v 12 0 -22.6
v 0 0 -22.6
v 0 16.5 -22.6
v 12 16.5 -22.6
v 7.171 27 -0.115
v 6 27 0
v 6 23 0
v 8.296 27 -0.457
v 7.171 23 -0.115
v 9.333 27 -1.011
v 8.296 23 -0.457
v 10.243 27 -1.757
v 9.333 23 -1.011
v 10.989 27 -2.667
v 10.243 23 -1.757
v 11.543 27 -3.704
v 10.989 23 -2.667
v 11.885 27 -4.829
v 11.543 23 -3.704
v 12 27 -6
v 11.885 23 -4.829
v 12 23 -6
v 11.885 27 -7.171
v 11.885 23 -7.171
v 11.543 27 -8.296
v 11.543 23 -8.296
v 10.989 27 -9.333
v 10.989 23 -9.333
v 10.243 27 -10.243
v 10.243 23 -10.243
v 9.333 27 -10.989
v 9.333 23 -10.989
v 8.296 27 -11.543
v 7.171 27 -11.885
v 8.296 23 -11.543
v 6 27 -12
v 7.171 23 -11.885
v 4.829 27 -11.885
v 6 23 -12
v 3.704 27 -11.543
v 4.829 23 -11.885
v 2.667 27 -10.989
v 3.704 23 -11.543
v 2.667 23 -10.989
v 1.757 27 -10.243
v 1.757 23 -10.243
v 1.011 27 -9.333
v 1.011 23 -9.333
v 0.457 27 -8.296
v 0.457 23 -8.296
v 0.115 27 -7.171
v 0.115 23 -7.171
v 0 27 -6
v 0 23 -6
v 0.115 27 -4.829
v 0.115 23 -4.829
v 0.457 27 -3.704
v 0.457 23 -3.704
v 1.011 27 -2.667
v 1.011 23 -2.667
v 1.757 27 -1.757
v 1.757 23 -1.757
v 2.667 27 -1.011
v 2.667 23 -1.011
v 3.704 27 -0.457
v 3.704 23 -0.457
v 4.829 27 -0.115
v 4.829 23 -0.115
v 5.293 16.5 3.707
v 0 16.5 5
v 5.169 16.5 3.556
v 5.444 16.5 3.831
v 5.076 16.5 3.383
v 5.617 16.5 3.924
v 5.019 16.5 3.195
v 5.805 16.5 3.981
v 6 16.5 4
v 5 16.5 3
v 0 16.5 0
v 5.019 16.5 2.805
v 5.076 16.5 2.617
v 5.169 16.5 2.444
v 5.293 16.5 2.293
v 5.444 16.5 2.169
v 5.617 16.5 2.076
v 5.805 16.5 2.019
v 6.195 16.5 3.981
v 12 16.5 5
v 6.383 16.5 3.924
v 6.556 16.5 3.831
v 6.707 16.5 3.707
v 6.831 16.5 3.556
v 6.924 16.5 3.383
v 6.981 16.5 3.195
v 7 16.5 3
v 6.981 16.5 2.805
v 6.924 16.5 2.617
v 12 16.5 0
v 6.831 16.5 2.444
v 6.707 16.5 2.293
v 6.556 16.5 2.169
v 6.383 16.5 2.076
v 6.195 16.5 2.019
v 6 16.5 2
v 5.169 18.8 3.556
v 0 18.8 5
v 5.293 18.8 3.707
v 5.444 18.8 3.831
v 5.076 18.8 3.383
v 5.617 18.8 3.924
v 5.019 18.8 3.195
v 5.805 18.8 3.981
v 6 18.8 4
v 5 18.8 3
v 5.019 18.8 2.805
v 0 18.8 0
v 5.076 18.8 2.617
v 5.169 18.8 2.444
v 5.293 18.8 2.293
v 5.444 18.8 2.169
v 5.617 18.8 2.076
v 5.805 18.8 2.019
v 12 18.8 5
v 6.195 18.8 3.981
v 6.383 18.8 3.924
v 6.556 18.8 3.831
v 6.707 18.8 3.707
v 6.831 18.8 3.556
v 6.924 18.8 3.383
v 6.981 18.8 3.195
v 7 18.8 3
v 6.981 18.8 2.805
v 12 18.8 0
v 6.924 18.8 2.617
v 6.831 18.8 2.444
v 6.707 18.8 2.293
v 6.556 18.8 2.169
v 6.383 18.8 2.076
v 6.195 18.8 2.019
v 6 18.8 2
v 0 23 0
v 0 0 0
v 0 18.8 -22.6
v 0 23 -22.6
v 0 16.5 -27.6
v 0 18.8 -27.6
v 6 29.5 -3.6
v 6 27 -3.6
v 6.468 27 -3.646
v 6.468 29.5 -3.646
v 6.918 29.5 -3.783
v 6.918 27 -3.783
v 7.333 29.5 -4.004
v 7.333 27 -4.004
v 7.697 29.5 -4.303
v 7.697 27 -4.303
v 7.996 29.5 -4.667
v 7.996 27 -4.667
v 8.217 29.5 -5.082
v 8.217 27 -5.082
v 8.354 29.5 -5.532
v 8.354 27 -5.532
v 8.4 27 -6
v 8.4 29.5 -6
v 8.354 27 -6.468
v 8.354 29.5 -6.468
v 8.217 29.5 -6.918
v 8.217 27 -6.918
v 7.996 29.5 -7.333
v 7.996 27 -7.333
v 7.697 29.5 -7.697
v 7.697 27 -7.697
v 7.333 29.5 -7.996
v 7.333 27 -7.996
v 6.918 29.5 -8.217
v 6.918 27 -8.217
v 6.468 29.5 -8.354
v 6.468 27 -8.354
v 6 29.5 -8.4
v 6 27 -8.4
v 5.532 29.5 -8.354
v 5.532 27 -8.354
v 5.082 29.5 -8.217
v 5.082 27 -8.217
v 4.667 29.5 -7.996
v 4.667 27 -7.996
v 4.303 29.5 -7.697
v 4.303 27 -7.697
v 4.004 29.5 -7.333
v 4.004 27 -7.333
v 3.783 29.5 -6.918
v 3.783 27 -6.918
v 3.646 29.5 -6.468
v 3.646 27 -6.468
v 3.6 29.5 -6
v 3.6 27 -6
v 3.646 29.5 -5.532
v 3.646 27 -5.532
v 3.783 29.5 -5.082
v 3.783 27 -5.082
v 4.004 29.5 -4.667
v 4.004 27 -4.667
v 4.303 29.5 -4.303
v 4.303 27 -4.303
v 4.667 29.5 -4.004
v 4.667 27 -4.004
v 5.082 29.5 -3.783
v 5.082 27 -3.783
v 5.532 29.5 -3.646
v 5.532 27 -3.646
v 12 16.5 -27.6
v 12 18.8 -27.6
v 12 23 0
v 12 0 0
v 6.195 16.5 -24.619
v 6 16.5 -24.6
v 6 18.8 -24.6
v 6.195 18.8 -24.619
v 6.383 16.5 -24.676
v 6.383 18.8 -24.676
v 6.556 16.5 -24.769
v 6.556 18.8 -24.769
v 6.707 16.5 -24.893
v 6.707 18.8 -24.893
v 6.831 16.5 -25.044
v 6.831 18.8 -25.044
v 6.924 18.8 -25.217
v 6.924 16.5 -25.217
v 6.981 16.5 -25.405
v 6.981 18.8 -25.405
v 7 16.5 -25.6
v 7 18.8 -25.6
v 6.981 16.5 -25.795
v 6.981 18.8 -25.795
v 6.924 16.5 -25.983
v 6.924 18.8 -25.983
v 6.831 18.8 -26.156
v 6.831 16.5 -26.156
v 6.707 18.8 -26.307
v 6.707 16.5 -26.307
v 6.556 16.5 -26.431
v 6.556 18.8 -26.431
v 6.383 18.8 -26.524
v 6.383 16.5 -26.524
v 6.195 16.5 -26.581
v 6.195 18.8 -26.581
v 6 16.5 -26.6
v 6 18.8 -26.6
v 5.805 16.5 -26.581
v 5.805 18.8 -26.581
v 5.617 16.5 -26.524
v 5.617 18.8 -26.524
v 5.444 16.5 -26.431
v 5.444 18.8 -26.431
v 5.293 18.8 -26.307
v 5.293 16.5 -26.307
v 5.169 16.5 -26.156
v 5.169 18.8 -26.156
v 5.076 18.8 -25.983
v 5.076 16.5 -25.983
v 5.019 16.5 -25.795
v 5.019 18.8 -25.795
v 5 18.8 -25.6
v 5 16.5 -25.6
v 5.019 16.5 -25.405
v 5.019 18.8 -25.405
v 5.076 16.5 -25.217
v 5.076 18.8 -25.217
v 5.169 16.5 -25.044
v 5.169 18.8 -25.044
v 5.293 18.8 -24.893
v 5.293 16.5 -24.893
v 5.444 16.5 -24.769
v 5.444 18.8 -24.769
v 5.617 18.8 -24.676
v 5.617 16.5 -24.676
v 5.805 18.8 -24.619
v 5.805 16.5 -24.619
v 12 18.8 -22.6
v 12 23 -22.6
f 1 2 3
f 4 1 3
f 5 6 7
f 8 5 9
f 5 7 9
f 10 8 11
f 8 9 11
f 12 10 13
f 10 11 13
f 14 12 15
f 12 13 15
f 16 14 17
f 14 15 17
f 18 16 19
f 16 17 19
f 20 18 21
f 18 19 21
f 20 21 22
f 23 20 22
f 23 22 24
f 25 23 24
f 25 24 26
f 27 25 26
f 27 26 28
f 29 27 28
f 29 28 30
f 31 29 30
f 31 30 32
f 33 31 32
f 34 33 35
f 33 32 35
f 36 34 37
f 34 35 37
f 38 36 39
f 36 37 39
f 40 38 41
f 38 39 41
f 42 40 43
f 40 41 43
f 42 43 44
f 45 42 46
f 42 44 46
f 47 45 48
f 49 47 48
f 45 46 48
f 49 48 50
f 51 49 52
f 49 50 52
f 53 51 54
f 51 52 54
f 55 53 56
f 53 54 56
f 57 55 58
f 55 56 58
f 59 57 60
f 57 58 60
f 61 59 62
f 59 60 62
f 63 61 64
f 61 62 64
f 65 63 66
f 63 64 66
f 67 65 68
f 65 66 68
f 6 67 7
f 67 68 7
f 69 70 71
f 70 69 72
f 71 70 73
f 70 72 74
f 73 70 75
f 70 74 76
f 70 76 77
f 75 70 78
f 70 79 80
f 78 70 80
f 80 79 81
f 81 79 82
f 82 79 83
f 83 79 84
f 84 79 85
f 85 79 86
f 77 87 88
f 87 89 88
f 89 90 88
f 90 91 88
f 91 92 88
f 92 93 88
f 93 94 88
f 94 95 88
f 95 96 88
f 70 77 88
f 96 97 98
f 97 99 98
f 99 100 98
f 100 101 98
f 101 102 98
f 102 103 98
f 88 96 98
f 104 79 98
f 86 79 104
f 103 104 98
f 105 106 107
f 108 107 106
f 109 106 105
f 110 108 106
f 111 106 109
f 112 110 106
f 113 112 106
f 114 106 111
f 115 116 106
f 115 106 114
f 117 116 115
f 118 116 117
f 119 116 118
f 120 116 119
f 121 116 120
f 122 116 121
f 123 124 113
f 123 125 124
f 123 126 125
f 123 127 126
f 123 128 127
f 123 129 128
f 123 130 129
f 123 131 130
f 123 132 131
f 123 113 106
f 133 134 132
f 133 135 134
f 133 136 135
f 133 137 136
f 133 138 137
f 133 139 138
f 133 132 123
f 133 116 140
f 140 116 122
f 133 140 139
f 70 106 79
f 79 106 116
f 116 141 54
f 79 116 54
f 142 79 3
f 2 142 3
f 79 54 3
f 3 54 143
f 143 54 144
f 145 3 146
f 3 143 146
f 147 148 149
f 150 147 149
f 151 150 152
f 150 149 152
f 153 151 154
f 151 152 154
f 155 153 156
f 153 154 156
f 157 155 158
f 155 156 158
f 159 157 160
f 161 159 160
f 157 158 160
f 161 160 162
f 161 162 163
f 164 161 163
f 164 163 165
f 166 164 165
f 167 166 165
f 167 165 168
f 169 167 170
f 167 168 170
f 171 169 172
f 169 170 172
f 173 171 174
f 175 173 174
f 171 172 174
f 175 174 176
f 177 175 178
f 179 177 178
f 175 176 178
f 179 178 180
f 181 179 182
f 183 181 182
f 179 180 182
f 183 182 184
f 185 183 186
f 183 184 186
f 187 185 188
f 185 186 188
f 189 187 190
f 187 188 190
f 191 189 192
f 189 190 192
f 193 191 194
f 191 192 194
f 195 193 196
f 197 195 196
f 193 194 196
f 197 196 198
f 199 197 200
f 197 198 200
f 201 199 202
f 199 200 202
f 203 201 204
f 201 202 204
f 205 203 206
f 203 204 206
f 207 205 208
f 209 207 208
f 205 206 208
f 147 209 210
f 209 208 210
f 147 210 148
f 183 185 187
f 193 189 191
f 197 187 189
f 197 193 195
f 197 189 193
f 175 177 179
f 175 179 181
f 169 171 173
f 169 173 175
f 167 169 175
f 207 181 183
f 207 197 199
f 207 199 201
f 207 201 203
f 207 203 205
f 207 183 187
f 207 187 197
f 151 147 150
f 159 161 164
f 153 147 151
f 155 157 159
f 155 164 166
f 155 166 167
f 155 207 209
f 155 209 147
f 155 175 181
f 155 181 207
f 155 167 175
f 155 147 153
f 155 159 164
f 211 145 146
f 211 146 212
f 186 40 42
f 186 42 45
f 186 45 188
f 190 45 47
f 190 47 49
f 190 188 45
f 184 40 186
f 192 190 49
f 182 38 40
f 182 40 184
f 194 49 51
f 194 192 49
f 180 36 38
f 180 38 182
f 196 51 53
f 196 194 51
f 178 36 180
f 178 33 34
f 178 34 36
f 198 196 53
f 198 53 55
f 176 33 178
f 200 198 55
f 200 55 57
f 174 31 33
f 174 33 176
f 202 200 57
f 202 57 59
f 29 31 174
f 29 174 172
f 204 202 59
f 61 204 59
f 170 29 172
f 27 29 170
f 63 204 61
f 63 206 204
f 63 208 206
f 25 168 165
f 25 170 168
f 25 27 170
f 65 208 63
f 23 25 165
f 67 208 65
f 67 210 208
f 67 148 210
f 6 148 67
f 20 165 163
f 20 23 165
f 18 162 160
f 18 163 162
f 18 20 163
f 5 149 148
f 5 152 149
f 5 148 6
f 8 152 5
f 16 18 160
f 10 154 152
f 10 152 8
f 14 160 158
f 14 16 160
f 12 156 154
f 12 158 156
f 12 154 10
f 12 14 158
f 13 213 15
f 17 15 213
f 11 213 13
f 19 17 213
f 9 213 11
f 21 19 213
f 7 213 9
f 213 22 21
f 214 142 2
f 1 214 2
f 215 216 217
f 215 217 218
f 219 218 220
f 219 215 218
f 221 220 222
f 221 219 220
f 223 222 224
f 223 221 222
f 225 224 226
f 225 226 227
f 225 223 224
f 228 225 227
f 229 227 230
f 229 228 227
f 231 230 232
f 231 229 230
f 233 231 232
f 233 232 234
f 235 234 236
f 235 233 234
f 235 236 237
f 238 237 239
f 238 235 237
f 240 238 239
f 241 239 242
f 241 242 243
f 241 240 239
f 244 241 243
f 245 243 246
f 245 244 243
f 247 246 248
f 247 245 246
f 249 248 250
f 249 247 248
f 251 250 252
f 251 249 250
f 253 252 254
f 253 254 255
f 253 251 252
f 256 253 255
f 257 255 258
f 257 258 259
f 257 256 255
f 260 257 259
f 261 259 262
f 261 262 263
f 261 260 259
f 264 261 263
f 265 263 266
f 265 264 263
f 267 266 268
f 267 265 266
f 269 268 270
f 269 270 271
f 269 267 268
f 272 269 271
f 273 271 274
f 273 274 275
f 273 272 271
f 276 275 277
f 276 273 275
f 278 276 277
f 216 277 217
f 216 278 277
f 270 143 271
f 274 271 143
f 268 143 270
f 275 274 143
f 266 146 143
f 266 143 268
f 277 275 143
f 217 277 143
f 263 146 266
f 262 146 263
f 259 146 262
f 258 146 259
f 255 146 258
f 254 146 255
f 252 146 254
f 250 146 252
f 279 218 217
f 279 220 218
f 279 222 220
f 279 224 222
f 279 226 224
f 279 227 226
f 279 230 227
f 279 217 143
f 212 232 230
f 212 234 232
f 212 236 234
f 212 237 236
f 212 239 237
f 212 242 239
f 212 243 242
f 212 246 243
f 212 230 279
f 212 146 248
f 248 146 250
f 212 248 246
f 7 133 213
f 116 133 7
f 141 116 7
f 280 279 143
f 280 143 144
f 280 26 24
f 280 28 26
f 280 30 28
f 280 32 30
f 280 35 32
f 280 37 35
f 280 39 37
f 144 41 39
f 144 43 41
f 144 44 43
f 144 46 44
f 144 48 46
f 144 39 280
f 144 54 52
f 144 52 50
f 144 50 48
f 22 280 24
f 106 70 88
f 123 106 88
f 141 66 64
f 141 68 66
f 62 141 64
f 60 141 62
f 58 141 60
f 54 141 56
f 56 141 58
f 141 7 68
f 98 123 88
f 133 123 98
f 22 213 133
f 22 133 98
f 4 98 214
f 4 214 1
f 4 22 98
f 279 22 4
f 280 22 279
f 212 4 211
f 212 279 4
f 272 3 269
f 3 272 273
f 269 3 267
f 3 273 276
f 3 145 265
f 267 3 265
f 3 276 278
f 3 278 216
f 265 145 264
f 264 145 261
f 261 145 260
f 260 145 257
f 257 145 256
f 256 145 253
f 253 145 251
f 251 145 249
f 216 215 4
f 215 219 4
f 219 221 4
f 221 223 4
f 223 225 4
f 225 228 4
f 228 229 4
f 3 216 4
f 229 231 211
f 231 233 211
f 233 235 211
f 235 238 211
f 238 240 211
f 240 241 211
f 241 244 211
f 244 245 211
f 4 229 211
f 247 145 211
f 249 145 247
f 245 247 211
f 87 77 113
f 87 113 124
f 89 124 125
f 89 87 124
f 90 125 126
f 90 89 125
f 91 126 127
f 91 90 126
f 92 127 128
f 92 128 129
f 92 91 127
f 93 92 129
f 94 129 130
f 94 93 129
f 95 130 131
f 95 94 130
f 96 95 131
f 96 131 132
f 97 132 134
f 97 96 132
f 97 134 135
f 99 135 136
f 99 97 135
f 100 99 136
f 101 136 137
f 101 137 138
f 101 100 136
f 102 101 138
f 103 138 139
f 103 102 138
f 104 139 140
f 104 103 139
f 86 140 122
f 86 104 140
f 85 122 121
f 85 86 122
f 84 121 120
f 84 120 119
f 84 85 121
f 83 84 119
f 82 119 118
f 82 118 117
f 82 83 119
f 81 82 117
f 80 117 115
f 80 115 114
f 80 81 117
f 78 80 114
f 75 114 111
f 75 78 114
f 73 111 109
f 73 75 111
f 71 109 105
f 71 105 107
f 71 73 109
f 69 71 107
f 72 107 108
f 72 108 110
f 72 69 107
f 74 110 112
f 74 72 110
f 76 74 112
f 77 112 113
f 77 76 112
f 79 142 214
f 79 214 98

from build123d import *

# Parameters (mm, degrees)
SKETCH1_W           = 22.6
SKETCH1_H           = 23
BOSS_EXTRUDE1_DEPTH = 12
SKETCH2_R           = 6
BOSS_EXTRUDE2_DEPTH = 4
SKETCH3_R           = 2.4
BOSS_EXTRUDE3_DEPTH = 2.5
SKETCH4_W           = 12
SKETCH4_H           = 5
SKETCH4_R           = 1
BOSS_EXTRUDE4_DEPTH = 2.3


with BuildPart() as part:
    # Sketch1 → Boss-Extrude1 (new body)
    with BuildSketch(Plane(origin=(0, 0, 0), x_dir=(0, 0, -1), z_dir=(1, 0, 0))):
        with Locations((11.3, 11.5)):
            Rectangle(SKETCH1_W, SKETCH1_H)
    extrude(amount=BOSS_EXTRUDE1_DEPTH)

    # Sketch2 → Boss-Extrude2 (add)
    with BuildSketch(Plane(origin=(0, 23, 0), x_dir=(1, 0, 0), z_dir=(0, 1, 0))):
        with Locations(Location((6, 6, 0), (0, 0, 270))):
            Circle(SKETCH2_R)
    extrude(amount=BOSS_EXTRUDE2_DEPTH)

    # Sketch3 → Boss-Extrude3 (add)
    with BuildSketch(Plane(origin=(0, 27, 0), x_dir=(1, 0, 0), z_dir=(0, 1, 0))):
        with Locations(Location((6, 6, 0), (0, 0, 270))):
            Circle(SKETCH3_R)
    extrude(amount=BOSS_EXTRUDE3_DEPTH)

    # Sketch4 → Boss-Extrude4 (add)
    # profile 1 of 2: a face of its own
    with BuildSketch(Plane(origin=(0, 16.5, 0), x_dir=(1, 0, 0), z_dir=(0, 1, 0))):
        with Locations((6, -2.5)):
            Rectangle(SKETCH4_W, SKETCH4_H)
        with Locations(Location((6, -3, 0), (0, 0, 270))):
            Circle(SKETCH4_R, mode=Mode.SUBTRACT)
    # profile 2 of 2: a face of its own
    with BuildSketch(Plane(origin=(0, 16.5, 0), x_dir=(1, 0, 0), z_dir=(0, 1, 0))):
        with Locations((6, 25.1)):
            Rectangle(SKETCH4_W, SKETCH4_H)
        with Locations(Location((6, 25.6, 0), (0, 0, 270))):
            Circle(SKETCH4_R, mode=Mode.SUBTRACT)
    extrude(amount=BOSS_EXTRUDE4_DEPTH)


solid = part.part
